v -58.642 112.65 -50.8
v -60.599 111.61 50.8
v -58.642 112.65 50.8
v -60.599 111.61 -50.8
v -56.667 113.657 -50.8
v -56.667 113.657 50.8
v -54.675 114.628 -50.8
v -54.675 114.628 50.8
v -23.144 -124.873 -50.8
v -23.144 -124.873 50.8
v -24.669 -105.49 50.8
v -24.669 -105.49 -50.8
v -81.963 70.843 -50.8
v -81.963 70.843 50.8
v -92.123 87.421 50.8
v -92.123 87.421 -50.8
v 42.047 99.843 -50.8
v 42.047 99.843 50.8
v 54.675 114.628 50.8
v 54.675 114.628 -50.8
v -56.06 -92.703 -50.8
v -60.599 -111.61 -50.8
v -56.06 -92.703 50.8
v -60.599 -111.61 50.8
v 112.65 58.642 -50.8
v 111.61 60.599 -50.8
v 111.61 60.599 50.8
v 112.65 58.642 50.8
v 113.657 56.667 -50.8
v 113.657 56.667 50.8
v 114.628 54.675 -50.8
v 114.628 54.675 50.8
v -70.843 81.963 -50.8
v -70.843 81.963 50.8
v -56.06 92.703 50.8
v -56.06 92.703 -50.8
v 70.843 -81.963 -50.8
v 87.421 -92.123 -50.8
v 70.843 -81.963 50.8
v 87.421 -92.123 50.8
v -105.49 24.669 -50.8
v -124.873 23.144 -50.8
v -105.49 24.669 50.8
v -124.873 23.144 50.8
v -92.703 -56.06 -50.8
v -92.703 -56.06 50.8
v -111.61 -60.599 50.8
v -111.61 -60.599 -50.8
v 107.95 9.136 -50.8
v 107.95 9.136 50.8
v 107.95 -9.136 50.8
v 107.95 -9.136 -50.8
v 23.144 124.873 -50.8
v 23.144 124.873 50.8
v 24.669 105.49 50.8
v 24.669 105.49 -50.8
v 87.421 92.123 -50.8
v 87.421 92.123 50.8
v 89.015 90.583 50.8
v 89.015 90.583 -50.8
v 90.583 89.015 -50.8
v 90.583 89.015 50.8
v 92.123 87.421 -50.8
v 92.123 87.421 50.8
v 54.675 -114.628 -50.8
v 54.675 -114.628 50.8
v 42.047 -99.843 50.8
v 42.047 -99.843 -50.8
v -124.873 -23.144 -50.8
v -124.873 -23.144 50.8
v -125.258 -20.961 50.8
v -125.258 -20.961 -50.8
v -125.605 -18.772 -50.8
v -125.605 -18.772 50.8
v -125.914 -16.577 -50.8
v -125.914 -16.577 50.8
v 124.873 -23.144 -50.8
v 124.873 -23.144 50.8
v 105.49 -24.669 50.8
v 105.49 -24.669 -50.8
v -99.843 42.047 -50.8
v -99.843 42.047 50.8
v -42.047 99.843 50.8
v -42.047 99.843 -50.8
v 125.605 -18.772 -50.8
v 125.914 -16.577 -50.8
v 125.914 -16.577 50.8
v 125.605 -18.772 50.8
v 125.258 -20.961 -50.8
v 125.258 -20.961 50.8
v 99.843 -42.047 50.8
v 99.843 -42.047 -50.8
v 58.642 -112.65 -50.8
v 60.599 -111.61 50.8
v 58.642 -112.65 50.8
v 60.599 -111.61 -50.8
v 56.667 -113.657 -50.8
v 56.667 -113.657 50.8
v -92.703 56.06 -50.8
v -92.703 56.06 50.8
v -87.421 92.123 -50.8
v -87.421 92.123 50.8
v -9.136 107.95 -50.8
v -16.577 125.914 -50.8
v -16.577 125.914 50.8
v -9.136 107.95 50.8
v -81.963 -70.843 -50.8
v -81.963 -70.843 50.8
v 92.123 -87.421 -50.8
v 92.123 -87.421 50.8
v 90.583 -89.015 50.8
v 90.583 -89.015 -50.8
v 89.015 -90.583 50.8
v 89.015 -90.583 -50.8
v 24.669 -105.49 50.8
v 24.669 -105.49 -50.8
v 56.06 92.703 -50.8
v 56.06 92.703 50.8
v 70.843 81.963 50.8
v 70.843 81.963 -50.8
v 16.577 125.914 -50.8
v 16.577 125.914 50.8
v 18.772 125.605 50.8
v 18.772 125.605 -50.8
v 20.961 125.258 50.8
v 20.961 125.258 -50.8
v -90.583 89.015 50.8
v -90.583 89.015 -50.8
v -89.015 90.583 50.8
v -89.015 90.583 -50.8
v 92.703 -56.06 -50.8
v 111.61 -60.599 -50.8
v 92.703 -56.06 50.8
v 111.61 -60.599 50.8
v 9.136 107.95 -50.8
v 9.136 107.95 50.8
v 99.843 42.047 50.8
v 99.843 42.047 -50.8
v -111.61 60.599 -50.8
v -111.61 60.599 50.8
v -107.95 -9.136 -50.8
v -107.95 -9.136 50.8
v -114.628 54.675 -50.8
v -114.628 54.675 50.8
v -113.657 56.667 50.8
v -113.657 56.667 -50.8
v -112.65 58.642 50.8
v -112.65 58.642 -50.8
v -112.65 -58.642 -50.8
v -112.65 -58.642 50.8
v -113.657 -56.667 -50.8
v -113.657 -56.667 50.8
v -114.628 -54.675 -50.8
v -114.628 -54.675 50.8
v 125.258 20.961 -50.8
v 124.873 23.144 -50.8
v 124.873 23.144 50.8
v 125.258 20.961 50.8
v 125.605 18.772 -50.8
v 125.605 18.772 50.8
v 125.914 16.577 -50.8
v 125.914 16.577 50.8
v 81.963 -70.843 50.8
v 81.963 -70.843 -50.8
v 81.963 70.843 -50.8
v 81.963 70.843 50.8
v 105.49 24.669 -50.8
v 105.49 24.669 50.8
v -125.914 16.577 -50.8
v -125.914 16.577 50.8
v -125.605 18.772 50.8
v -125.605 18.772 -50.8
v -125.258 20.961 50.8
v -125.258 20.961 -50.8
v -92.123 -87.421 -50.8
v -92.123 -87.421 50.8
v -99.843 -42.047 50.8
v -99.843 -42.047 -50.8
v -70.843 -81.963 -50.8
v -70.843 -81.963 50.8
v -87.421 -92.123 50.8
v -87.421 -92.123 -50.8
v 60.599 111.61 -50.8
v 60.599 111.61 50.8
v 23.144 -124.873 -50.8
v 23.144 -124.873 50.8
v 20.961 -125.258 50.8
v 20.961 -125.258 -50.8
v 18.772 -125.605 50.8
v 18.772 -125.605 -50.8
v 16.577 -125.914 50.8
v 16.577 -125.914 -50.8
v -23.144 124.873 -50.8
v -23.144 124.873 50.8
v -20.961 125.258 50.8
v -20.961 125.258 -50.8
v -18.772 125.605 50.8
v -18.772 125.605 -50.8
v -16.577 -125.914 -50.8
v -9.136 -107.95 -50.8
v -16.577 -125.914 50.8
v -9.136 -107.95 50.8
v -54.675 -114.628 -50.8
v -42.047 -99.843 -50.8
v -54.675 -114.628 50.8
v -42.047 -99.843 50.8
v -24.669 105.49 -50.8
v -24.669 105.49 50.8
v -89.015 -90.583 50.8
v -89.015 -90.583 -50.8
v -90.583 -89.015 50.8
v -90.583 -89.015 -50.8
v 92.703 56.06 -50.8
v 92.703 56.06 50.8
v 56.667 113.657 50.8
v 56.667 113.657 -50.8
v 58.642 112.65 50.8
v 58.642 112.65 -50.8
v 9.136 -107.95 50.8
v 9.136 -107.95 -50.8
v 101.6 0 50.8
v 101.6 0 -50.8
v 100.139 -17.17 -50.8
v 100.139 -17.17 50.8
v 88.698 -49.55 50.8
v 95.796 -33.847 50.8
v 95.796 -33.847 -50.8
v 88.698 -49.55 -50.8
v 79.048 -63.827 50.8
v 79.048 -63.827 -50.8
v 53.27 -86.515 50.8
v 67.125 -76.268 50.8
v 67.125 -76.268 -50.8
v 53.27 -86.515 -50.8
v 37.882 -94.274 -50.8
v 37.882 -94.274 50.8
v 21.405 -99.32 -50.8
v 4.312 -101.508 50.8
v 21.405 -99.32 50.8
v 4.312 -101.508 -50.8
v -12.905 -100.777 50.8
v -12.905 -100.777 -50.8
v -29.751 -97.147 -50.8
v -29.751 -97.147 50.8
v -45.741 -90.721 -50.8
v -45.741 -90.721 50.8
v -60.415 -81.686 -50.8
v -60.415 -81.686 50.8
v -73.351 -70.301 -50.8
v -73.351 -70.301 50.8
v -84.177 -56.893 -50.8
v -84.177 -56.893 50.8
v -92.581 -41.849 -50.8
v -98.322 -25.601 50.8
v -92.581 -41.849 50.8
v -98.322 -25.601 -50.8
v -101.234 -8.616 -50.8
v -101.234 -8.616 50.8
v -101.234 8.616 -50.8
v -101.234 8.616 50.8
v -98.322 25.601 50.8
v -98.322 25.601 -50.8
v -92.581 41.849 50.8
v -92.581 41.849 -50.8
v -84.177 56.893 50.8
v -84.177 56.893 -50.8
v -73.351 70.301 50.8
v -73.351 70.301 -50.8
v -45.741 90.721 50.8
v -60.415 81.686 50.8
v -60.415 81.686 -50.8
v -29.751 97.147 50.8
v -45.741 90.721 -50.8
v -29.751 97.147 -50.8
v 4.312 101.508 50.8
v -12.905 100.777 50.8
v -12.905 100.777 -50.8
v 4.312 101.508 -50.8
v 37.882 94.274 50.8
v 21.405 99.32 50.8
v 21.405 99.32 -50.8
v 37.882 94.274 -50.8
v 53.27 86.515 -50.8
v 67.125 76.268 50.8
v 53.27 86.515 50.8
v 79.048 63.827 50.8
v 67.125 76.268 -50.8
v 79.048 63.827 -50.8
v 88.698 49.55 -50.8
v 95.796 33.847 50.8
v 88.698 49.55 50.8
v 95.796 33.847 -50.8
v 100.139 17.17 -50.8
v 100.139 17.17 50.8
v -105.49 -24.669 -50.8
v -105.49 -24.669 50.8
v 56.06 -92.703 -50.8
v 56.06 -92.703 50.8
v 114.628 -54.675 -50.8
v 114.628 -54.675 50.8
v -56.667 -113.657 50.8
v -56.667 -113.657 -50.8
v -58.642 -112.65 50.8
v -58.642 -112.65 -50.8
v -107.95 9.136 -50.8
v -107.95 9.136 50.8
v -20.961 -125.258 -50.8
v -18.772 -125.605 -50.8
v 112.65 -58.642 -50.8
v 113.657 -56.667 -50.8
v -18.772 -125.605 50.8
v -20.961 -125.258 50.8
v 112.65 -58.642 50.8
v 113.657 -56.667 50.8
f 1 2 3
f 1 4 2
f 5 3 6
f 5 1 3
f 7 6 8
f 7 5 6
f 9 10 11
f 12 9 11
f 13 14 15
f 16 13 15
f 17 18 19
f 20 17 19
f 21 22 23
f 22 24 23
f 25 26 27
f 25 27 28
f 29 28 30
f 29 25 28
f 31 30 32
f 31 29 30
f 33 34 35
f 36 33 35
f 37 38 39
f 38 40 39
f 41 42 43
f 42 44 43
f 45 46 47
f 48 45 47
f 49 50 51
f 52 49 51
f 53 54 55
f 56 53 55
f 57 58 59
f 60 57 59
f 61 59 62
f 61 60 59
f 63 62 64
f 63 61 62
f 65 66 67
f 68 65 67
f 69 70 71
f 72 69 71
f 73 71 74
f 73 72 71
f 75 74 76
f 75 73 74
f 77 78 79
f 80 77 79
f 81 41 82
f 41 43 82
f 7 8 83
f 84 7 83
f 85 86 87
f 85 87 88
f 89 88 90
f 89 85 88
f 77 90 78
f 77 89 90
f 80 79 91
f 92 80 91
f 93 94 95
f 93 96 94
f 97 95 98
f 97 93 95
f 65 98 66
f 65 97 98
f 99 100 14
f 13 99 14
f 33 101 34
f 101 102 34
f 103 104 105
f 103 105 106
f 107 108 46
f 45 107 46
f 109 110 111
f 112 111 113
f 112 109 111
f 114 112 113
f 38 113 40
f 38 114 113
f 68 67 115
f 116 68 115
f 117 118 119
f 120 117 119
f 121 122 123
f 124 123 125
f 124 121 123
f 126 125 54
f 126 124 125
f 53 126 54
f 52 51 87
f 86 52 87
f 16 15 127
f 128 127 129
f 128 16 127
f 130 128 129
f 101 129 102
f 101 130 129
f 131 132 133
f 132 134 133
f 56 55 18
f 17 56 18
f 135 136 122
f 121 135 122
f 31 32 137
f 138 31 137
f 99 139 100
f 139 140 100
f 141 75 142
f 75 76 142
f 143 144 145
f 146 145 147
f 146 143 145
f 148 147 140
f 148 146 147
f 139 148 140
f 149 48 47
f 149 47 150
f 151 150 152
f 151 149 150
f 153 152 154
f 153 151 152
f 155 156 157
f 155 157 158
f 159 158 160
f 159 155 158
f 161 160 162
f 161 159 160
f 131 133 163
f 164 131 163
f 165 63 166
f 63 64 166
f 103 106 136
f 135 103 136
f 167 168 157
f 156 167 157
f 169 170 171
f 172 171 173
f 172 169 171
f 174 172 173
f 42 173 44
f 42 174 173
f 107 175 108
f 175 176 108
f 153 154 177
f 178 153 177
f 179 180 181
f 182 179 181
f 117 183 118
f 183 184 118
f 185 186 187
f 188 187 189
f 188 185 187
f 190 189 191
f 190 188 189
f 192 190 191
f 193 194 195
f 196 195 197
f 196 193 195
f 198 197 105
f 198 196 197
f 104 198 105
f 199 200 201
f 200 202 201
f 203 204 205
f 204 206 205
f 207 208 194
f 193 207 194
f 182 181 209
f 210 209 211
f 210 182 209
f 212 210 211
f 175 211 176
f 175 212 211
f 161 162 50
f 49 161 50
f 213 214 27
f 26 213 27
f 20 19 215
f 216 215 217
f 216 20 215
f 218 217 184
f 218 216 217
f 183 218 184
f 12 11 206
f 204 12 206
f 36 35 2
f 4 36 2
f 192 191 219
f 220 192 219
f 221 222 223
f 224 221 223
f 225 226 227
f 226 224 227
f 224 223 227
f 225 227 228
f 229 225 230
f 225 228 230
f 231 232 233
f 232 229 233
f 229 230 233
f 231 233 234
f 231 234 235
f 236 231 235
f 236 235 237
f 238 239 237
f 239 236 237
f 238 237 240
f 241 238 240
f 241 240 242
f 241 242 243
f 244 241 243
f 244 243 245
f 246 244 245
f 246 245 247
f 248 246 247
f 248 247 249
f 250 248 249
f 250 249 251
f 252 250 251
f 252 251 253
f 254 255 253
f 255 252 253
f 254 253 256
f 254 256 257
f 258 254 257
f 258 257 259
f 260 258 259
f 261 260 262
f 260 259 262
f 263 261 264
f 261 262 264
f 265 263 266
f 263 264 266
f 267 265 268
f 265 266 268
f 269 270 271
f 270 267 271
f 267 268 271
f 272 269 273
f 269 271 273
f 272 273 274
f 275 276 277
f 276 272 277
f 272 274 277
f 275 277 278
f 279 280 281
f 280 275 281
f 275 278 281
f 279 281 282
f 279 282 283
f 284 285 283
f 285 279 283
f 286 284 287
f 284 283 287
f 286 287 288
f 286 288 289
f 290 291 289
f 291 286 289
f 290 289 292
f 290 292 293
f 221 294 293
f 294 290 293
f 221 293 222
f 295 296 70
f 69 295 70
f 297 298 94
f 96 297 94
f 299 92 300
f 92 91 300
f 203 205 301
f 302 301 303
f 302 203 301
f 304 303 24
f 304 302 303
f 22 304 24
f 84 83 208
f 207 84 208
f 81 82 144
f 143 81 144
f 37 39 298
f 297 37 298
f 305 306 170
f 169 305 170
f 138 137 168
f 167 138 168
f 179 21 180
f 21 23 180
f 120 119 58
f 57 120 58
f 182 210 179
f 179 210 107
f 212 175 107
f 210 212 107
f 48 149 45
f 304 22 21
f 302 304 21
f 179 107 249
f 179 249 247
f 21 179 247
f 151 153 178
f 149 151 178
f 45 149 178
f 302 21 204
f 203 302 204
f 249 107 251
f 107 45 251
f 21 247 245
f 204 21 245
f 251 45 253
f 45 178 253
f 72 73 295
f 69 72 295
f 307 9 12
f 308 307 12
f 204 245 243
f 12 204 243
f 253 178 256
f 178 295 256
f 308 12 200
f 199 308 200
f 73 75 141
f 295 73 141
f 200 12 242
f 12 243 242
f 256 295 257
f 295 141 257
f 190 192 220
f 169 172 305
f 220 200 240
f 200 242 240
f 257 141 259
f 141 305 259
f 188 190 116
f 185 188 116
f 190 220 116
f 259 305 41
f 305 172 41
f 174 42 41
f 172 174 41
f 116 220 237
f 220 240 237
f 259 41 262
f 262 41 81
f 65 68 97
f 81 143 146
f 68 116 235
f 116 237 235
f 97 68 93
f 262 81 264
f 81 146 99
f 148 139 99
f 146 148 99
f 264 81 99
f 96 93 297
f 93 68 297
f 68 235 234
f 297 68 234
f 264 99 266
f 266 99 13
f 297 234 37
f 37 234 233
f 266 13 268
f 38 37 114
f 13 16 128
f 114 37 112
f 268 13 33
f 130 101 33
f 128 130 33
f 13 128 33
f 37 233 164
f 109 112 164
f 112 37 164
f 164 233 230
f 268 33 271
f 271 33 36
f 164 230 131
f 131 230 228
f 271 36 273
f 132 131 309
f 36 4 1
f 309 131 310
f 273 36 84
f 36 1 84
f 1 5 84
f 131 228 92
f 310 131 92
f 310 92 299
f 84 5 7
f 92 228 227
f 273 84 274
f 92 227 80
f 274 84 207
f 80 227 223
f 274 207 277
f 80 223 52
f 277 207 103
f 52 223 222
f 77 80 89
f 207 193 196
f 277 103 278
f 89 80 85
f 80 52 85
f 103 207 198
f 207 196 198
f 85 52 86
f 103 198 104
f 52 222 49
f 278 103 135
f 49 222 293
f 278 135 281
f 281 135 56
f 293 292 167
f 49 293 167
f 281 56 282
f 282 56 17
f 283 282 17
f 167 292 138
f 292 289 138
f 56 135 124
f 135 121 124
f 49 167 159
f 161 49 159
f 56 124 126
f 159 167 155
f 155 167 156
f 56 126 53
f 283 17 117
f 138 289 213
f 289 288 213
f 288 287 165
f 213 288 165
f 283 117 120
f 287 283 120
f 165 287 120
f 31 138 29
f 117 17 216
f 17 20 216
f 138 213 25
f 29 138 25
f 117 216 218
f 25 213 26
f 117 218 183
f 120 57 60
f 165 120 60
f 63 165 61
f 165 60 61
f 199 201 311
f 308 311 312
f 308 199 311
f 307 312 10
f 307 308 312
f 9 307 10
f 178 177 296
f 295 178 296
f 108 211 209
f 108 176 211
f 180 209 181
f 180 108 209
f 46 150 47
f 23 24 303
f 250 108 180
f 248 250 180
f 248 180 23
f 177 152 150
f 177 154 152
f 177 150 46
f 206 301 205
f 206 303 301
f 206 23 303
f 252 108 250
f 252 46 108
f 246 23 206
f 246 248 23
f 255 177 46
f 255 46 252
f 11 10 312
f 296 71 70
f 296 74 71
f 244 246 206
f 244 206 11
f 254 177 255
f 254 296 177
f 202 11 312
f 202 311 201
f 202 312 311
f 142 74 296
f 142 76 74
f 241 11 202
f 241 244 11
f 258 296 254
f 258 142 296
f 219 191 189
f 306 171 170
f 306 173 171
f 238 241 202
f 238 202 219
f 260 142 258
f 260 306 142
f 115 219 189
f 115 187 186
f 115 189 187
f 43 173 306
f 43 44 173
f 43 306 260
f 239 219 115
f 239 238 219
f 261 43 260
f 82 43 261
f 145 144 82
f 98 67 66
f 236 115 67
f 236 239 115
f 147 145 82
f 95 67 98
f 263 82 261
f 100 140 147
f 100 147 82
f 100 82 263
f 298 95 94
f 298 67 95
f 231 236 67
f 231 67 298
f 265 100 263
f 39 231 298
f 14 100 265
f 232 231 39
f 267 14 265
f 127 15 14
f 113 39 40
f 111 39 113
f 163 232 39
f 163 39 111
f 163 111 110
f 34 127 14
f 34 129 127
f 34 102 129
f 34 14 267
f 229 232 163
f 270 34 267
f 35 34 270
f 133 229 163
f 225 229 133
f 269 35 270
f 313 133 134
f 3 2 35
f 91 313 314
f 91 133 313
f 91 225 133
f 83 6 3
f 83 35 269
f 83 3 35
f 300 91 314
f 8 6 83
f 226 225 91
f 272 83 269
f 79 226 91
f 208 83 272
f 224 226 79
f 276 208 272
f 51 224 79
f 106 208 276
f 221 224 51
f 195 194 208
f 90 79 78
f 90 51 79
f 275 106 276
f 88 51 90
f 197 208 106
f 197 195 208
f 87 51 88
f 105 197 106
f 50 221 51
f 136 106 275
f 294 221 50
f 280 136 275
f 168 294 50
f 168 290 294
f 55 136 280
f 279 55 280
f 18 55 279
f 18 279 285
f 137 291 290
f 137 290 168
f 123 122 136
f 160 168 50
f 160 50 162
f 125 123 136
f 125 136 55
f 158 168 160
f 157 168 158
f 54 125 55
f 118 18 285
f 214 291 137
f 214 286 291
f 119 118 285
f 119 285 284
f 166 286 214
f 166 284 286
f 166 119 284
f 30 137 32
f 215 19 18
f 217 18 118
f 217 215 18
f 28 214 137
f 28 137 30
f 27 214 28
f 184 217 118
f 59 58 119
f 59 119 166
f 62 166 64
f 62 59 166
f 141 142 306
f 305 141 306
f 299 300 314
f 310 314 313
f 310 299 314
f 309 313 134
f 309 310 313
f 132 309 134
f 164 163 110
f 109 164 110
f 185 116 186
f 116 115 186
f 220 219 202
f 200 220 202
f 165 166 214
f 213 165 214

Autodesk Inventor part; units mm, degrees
ref_plane "YZ Plane" through (0, 0, 0) normal (1, 0, 0) x (0, 1, 0)
ref_plane "XZ Plane" through (0, 0, 0) normal (0, 1, 0) x (-1, 0, 0)
ref_plane "XY Plane" through (0, 0, 0) normal (0, 0, 1) x (1, 0, 0)
sketch "Sketch1" plane through (0, 0, 0) normal (0, 0, 1) x (1, 0, 0)
  circle A0 centre (0, 0) radius 101.6
  circle A1 centre (0, 0) radius 127
  dimension "d0" = 203.2
  dimension "d1" = 25.4
extrude "Extrusion1" add sketch "Sketch1" along normal mid plane 101.6
sketch "Sketch2" plane through (0, 0, 50.8) normal (0, 0, 1) x (1, 0, 0)
  circle A0 centre (0, 0) radius 127 projected
  line L0 (-16.5768, 125.9135) -> (-9.1361, 107.95)
  line L1 (-9.1361, 107.95) -> (9.1361, 107.95)
  line L2 (9.1361, 107.95) -> (16.5768, 125.9135)
  line L3 (0, 107.95) -> (0, 128.4311) construction
  line L4 (-16.5768, 125.9135) -> (0, 0) construction
  line L5 (0, 0) -> (16.5768, 125.9135) construction
  arc A1 (16.5768, 125.9135) -> (-16.5768, 125.9135) centre (0, 0) ccw
  dimension "d4" = 19.05
  dimension "d5" = 45
  dimension "d6" = 15
extrude "Extrusion2" cut sketch "Sketch2" against normal through all contours L2 L1 L0 A0 picked at (-1.8466, 114.2597)
pattern_circular "Circular Pattern1" count 20 over 360 about axis through (0, 0, 0) along (0, 0, 1) of "Extrusion2"
properties part number "NASA-20-TRD-01" material "PET Plastic"
